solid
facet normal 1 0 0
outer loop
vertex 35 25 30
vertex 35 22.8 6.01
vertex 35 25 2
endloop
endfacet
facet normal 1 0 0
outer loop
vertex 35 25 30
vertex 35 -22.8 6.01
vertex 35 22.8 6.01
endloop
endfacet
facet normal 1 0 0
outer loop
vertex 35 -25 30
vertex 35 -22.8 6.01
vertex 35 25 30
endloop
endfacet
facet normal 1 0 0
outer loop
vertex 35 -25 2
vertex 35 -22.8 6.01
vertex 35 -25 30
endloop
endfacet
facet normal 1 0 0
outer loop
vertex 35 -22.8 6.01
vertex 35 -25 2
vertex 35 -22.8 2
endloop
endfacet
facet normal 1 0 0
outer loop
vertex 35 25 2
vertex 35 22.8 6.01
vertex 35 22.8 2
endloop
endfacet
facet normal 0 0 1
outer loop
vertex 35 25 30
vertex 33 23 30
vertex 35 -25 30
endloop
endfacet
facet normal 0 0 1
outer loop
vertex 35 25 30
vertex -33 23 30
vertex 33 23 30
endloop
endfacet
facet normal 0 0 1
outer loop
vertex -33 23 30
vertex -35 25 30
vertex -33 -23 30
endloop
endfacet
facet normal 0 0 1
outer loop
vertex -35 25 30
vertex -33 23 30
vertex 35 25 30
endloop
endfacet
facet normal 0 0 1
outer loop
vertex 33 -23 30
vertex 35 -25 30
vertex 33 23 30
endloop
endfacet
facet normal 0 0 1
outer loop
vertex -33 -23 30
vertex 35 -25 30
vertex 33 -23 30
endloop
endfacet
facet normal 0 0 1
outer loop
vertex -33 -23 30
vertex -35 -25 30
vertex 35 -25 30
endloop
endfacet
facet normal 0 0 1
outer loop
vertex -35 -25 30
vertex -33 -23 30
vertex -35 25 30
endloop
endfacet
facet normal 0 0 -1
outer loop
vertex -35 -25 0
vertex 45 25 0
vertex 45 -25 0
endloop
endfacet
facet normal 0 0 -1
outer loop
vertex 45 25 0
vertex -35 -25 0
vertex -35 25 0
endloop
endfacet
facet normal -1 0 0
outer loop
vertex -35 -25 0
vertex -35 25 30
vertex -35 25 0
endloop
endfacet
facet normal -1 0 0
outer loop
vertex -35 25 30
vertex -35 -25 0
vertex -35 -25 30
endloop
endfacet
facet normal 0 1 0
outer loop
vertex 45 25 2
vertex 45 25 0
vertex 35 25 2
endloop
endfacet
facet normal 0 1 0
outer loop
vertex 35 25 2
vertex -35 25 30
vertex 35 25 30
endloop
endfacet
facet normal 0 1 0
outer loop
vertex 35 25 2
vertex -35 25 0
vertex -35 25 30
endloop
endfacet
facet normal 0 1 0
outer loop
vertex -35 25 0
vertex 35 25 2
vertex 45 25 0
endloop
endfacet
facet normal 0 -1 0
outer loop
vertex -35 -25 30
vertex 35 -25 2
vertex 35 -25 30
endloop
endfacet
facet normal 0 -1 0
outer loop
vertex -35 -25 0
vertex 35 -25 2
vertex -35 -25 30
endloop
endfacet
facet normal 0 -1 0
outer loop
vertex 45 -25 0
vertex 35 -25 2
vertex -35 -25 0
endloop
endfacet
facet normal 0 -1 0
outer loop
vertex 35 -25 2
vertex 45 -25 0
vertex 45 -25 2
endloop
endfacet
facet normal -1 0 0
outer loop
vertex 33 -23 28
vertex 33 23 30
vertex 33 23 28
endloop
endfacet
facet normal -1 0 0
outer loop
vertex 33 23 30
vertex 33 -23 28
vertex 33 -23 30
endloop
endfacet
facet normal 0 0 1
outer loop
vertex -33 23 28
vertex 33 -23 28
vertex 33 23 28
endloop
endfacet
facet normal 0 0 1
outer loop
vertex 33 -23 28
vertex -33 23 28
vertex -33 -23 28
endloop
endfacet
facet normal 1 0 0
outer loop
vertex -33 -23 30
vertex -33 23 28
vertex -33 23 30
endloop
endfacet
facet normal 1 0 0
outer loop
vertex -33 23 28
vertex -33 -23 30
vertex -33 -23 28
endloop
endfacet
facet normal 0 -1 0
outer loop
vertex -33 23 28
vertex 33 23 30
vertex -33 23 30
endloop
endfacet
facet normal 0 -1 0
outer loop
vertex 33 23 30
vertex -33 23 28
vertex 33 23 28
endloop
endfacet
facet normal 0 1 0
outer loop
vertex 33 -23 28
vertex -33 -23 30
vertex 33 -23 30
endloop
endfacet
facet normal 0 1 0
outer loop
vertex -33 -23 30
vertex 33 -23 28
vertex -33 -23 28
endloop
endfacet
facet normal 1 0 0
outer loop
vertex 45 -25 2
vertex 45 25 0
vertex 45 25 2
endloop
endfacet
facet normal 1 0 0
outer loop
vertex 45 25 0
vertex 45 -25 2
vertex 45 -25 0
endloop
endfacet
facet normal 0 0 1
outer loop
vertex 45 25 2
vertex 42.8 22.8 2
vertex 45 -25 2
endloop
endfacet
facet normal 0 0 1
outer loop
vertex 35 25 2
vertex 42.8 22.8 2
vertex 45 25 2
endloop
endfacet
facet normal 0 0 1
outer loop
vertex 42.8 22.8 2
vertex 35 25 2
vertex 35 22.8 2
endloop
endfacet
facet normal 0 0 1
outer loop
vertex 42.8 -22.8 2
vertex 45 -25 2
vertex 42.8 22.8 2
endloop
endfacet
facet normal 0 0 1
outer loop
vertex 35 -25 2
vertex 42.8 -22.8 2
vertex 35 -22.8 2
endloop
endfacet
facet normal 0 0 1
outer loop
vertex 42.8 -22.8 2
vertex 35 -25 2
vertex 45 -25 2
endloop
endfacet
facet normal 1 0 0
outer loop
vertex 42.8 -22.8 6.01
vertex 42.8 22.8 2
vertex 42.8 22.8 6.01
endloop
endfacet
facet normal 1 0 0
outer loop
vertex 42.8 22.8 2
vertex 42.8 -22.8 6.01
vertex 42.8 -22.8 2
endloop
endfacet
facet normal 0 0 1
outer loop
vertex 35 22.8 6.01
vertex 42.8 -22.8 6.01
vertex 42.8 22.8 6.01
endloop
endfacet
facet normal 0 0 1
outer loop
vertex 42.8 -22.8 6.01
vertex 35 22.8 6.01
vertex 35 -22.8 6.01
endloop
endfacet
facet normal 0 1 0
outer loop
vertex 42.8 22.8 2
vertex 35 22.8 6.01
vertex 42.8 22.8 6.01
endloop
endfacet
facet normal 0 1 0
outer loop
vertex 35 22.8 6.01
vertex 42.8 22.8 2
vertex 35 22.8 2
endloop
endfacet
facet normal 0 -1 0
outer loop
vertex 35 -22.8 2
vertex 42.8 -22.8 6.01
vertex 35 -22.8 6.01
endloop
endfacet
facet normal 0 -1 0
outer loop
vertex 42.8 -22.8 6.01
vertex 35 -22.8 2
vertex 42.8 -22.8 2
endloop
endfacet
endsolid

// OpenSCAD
// Two-part enclosure for a small electronics board (e.g. Arduino-based temperature logger)
// Print orientation: both parts lie on the bed (z = 0), side by side, with a 10 mm gap.
// Units: mm.

// ---------------- Parameters ----------------
box_x      = 70;    // box outer length (X)
box_y      = 50;    // box outer width (Y)
box_z      = 30;    // box outer height (Z)
wall       = 2;     // box wall thickness
floor      = 2;     // box floor thickness
lip_t      = 1.5;   // lid lip (wall) thickness
lip_h      = 4;     // lid lip height (above plate)
lip_outer_x = 65.6; // outer size of lip in X
lip_outer_y = 45.6; // outer size of lip in Y
clearance  = 0.2;   // clearance between lip outer size and box opening
overlap    = 0.01;  // small overlap so the lip passes into the open top
gap        = 10;    // gap between the two printed parts

$fn = 64;

// Derived: box opening (inner size)
opening_x = box_x - 2 * wall;   // 66
opening_y = box_y - 2 * wall;   // 46

// Check: lip outer size = opening - 2*clearance = 65.6 x 45.6 (matches spec)

// ---------------- Part 1: Box ----------------
module box() {
    difference() {
        translate([-box_x/2, -box_y/2, 0])
            cube([box_x, box_y, box_z]);
        // Open top: cut away the top floor_thick layer
        translate([-opening_x/2, -opening_y/2, box_z - floor])
            cube([opening_x, opening_y, floor + overlap]);
    }
}

// ---------------- Part 2: Lid ----------------
module lid() {
    // Plate lying on the bed
    plate_t = 2;
    translate([-box_x/2, -box_y/2, 0])
        cube([box_x, box_y, plate_t]);

    // Rectangular lip on top of the plate, centred, with clearance on each side
    // (outer size 65.6 x 45.6, 1.5 mm thick, 4 mm tall)
    translate([-lip_outer_x/2, -lip_outer_y/2, plate_t])
        cube([lip_outer_x, lip_outer_y, lip_h + overlap]);
}

// ---------------- Assembly ----------------
union() {
    box();
    translate([gap, 0, 0])
        lid();
}
